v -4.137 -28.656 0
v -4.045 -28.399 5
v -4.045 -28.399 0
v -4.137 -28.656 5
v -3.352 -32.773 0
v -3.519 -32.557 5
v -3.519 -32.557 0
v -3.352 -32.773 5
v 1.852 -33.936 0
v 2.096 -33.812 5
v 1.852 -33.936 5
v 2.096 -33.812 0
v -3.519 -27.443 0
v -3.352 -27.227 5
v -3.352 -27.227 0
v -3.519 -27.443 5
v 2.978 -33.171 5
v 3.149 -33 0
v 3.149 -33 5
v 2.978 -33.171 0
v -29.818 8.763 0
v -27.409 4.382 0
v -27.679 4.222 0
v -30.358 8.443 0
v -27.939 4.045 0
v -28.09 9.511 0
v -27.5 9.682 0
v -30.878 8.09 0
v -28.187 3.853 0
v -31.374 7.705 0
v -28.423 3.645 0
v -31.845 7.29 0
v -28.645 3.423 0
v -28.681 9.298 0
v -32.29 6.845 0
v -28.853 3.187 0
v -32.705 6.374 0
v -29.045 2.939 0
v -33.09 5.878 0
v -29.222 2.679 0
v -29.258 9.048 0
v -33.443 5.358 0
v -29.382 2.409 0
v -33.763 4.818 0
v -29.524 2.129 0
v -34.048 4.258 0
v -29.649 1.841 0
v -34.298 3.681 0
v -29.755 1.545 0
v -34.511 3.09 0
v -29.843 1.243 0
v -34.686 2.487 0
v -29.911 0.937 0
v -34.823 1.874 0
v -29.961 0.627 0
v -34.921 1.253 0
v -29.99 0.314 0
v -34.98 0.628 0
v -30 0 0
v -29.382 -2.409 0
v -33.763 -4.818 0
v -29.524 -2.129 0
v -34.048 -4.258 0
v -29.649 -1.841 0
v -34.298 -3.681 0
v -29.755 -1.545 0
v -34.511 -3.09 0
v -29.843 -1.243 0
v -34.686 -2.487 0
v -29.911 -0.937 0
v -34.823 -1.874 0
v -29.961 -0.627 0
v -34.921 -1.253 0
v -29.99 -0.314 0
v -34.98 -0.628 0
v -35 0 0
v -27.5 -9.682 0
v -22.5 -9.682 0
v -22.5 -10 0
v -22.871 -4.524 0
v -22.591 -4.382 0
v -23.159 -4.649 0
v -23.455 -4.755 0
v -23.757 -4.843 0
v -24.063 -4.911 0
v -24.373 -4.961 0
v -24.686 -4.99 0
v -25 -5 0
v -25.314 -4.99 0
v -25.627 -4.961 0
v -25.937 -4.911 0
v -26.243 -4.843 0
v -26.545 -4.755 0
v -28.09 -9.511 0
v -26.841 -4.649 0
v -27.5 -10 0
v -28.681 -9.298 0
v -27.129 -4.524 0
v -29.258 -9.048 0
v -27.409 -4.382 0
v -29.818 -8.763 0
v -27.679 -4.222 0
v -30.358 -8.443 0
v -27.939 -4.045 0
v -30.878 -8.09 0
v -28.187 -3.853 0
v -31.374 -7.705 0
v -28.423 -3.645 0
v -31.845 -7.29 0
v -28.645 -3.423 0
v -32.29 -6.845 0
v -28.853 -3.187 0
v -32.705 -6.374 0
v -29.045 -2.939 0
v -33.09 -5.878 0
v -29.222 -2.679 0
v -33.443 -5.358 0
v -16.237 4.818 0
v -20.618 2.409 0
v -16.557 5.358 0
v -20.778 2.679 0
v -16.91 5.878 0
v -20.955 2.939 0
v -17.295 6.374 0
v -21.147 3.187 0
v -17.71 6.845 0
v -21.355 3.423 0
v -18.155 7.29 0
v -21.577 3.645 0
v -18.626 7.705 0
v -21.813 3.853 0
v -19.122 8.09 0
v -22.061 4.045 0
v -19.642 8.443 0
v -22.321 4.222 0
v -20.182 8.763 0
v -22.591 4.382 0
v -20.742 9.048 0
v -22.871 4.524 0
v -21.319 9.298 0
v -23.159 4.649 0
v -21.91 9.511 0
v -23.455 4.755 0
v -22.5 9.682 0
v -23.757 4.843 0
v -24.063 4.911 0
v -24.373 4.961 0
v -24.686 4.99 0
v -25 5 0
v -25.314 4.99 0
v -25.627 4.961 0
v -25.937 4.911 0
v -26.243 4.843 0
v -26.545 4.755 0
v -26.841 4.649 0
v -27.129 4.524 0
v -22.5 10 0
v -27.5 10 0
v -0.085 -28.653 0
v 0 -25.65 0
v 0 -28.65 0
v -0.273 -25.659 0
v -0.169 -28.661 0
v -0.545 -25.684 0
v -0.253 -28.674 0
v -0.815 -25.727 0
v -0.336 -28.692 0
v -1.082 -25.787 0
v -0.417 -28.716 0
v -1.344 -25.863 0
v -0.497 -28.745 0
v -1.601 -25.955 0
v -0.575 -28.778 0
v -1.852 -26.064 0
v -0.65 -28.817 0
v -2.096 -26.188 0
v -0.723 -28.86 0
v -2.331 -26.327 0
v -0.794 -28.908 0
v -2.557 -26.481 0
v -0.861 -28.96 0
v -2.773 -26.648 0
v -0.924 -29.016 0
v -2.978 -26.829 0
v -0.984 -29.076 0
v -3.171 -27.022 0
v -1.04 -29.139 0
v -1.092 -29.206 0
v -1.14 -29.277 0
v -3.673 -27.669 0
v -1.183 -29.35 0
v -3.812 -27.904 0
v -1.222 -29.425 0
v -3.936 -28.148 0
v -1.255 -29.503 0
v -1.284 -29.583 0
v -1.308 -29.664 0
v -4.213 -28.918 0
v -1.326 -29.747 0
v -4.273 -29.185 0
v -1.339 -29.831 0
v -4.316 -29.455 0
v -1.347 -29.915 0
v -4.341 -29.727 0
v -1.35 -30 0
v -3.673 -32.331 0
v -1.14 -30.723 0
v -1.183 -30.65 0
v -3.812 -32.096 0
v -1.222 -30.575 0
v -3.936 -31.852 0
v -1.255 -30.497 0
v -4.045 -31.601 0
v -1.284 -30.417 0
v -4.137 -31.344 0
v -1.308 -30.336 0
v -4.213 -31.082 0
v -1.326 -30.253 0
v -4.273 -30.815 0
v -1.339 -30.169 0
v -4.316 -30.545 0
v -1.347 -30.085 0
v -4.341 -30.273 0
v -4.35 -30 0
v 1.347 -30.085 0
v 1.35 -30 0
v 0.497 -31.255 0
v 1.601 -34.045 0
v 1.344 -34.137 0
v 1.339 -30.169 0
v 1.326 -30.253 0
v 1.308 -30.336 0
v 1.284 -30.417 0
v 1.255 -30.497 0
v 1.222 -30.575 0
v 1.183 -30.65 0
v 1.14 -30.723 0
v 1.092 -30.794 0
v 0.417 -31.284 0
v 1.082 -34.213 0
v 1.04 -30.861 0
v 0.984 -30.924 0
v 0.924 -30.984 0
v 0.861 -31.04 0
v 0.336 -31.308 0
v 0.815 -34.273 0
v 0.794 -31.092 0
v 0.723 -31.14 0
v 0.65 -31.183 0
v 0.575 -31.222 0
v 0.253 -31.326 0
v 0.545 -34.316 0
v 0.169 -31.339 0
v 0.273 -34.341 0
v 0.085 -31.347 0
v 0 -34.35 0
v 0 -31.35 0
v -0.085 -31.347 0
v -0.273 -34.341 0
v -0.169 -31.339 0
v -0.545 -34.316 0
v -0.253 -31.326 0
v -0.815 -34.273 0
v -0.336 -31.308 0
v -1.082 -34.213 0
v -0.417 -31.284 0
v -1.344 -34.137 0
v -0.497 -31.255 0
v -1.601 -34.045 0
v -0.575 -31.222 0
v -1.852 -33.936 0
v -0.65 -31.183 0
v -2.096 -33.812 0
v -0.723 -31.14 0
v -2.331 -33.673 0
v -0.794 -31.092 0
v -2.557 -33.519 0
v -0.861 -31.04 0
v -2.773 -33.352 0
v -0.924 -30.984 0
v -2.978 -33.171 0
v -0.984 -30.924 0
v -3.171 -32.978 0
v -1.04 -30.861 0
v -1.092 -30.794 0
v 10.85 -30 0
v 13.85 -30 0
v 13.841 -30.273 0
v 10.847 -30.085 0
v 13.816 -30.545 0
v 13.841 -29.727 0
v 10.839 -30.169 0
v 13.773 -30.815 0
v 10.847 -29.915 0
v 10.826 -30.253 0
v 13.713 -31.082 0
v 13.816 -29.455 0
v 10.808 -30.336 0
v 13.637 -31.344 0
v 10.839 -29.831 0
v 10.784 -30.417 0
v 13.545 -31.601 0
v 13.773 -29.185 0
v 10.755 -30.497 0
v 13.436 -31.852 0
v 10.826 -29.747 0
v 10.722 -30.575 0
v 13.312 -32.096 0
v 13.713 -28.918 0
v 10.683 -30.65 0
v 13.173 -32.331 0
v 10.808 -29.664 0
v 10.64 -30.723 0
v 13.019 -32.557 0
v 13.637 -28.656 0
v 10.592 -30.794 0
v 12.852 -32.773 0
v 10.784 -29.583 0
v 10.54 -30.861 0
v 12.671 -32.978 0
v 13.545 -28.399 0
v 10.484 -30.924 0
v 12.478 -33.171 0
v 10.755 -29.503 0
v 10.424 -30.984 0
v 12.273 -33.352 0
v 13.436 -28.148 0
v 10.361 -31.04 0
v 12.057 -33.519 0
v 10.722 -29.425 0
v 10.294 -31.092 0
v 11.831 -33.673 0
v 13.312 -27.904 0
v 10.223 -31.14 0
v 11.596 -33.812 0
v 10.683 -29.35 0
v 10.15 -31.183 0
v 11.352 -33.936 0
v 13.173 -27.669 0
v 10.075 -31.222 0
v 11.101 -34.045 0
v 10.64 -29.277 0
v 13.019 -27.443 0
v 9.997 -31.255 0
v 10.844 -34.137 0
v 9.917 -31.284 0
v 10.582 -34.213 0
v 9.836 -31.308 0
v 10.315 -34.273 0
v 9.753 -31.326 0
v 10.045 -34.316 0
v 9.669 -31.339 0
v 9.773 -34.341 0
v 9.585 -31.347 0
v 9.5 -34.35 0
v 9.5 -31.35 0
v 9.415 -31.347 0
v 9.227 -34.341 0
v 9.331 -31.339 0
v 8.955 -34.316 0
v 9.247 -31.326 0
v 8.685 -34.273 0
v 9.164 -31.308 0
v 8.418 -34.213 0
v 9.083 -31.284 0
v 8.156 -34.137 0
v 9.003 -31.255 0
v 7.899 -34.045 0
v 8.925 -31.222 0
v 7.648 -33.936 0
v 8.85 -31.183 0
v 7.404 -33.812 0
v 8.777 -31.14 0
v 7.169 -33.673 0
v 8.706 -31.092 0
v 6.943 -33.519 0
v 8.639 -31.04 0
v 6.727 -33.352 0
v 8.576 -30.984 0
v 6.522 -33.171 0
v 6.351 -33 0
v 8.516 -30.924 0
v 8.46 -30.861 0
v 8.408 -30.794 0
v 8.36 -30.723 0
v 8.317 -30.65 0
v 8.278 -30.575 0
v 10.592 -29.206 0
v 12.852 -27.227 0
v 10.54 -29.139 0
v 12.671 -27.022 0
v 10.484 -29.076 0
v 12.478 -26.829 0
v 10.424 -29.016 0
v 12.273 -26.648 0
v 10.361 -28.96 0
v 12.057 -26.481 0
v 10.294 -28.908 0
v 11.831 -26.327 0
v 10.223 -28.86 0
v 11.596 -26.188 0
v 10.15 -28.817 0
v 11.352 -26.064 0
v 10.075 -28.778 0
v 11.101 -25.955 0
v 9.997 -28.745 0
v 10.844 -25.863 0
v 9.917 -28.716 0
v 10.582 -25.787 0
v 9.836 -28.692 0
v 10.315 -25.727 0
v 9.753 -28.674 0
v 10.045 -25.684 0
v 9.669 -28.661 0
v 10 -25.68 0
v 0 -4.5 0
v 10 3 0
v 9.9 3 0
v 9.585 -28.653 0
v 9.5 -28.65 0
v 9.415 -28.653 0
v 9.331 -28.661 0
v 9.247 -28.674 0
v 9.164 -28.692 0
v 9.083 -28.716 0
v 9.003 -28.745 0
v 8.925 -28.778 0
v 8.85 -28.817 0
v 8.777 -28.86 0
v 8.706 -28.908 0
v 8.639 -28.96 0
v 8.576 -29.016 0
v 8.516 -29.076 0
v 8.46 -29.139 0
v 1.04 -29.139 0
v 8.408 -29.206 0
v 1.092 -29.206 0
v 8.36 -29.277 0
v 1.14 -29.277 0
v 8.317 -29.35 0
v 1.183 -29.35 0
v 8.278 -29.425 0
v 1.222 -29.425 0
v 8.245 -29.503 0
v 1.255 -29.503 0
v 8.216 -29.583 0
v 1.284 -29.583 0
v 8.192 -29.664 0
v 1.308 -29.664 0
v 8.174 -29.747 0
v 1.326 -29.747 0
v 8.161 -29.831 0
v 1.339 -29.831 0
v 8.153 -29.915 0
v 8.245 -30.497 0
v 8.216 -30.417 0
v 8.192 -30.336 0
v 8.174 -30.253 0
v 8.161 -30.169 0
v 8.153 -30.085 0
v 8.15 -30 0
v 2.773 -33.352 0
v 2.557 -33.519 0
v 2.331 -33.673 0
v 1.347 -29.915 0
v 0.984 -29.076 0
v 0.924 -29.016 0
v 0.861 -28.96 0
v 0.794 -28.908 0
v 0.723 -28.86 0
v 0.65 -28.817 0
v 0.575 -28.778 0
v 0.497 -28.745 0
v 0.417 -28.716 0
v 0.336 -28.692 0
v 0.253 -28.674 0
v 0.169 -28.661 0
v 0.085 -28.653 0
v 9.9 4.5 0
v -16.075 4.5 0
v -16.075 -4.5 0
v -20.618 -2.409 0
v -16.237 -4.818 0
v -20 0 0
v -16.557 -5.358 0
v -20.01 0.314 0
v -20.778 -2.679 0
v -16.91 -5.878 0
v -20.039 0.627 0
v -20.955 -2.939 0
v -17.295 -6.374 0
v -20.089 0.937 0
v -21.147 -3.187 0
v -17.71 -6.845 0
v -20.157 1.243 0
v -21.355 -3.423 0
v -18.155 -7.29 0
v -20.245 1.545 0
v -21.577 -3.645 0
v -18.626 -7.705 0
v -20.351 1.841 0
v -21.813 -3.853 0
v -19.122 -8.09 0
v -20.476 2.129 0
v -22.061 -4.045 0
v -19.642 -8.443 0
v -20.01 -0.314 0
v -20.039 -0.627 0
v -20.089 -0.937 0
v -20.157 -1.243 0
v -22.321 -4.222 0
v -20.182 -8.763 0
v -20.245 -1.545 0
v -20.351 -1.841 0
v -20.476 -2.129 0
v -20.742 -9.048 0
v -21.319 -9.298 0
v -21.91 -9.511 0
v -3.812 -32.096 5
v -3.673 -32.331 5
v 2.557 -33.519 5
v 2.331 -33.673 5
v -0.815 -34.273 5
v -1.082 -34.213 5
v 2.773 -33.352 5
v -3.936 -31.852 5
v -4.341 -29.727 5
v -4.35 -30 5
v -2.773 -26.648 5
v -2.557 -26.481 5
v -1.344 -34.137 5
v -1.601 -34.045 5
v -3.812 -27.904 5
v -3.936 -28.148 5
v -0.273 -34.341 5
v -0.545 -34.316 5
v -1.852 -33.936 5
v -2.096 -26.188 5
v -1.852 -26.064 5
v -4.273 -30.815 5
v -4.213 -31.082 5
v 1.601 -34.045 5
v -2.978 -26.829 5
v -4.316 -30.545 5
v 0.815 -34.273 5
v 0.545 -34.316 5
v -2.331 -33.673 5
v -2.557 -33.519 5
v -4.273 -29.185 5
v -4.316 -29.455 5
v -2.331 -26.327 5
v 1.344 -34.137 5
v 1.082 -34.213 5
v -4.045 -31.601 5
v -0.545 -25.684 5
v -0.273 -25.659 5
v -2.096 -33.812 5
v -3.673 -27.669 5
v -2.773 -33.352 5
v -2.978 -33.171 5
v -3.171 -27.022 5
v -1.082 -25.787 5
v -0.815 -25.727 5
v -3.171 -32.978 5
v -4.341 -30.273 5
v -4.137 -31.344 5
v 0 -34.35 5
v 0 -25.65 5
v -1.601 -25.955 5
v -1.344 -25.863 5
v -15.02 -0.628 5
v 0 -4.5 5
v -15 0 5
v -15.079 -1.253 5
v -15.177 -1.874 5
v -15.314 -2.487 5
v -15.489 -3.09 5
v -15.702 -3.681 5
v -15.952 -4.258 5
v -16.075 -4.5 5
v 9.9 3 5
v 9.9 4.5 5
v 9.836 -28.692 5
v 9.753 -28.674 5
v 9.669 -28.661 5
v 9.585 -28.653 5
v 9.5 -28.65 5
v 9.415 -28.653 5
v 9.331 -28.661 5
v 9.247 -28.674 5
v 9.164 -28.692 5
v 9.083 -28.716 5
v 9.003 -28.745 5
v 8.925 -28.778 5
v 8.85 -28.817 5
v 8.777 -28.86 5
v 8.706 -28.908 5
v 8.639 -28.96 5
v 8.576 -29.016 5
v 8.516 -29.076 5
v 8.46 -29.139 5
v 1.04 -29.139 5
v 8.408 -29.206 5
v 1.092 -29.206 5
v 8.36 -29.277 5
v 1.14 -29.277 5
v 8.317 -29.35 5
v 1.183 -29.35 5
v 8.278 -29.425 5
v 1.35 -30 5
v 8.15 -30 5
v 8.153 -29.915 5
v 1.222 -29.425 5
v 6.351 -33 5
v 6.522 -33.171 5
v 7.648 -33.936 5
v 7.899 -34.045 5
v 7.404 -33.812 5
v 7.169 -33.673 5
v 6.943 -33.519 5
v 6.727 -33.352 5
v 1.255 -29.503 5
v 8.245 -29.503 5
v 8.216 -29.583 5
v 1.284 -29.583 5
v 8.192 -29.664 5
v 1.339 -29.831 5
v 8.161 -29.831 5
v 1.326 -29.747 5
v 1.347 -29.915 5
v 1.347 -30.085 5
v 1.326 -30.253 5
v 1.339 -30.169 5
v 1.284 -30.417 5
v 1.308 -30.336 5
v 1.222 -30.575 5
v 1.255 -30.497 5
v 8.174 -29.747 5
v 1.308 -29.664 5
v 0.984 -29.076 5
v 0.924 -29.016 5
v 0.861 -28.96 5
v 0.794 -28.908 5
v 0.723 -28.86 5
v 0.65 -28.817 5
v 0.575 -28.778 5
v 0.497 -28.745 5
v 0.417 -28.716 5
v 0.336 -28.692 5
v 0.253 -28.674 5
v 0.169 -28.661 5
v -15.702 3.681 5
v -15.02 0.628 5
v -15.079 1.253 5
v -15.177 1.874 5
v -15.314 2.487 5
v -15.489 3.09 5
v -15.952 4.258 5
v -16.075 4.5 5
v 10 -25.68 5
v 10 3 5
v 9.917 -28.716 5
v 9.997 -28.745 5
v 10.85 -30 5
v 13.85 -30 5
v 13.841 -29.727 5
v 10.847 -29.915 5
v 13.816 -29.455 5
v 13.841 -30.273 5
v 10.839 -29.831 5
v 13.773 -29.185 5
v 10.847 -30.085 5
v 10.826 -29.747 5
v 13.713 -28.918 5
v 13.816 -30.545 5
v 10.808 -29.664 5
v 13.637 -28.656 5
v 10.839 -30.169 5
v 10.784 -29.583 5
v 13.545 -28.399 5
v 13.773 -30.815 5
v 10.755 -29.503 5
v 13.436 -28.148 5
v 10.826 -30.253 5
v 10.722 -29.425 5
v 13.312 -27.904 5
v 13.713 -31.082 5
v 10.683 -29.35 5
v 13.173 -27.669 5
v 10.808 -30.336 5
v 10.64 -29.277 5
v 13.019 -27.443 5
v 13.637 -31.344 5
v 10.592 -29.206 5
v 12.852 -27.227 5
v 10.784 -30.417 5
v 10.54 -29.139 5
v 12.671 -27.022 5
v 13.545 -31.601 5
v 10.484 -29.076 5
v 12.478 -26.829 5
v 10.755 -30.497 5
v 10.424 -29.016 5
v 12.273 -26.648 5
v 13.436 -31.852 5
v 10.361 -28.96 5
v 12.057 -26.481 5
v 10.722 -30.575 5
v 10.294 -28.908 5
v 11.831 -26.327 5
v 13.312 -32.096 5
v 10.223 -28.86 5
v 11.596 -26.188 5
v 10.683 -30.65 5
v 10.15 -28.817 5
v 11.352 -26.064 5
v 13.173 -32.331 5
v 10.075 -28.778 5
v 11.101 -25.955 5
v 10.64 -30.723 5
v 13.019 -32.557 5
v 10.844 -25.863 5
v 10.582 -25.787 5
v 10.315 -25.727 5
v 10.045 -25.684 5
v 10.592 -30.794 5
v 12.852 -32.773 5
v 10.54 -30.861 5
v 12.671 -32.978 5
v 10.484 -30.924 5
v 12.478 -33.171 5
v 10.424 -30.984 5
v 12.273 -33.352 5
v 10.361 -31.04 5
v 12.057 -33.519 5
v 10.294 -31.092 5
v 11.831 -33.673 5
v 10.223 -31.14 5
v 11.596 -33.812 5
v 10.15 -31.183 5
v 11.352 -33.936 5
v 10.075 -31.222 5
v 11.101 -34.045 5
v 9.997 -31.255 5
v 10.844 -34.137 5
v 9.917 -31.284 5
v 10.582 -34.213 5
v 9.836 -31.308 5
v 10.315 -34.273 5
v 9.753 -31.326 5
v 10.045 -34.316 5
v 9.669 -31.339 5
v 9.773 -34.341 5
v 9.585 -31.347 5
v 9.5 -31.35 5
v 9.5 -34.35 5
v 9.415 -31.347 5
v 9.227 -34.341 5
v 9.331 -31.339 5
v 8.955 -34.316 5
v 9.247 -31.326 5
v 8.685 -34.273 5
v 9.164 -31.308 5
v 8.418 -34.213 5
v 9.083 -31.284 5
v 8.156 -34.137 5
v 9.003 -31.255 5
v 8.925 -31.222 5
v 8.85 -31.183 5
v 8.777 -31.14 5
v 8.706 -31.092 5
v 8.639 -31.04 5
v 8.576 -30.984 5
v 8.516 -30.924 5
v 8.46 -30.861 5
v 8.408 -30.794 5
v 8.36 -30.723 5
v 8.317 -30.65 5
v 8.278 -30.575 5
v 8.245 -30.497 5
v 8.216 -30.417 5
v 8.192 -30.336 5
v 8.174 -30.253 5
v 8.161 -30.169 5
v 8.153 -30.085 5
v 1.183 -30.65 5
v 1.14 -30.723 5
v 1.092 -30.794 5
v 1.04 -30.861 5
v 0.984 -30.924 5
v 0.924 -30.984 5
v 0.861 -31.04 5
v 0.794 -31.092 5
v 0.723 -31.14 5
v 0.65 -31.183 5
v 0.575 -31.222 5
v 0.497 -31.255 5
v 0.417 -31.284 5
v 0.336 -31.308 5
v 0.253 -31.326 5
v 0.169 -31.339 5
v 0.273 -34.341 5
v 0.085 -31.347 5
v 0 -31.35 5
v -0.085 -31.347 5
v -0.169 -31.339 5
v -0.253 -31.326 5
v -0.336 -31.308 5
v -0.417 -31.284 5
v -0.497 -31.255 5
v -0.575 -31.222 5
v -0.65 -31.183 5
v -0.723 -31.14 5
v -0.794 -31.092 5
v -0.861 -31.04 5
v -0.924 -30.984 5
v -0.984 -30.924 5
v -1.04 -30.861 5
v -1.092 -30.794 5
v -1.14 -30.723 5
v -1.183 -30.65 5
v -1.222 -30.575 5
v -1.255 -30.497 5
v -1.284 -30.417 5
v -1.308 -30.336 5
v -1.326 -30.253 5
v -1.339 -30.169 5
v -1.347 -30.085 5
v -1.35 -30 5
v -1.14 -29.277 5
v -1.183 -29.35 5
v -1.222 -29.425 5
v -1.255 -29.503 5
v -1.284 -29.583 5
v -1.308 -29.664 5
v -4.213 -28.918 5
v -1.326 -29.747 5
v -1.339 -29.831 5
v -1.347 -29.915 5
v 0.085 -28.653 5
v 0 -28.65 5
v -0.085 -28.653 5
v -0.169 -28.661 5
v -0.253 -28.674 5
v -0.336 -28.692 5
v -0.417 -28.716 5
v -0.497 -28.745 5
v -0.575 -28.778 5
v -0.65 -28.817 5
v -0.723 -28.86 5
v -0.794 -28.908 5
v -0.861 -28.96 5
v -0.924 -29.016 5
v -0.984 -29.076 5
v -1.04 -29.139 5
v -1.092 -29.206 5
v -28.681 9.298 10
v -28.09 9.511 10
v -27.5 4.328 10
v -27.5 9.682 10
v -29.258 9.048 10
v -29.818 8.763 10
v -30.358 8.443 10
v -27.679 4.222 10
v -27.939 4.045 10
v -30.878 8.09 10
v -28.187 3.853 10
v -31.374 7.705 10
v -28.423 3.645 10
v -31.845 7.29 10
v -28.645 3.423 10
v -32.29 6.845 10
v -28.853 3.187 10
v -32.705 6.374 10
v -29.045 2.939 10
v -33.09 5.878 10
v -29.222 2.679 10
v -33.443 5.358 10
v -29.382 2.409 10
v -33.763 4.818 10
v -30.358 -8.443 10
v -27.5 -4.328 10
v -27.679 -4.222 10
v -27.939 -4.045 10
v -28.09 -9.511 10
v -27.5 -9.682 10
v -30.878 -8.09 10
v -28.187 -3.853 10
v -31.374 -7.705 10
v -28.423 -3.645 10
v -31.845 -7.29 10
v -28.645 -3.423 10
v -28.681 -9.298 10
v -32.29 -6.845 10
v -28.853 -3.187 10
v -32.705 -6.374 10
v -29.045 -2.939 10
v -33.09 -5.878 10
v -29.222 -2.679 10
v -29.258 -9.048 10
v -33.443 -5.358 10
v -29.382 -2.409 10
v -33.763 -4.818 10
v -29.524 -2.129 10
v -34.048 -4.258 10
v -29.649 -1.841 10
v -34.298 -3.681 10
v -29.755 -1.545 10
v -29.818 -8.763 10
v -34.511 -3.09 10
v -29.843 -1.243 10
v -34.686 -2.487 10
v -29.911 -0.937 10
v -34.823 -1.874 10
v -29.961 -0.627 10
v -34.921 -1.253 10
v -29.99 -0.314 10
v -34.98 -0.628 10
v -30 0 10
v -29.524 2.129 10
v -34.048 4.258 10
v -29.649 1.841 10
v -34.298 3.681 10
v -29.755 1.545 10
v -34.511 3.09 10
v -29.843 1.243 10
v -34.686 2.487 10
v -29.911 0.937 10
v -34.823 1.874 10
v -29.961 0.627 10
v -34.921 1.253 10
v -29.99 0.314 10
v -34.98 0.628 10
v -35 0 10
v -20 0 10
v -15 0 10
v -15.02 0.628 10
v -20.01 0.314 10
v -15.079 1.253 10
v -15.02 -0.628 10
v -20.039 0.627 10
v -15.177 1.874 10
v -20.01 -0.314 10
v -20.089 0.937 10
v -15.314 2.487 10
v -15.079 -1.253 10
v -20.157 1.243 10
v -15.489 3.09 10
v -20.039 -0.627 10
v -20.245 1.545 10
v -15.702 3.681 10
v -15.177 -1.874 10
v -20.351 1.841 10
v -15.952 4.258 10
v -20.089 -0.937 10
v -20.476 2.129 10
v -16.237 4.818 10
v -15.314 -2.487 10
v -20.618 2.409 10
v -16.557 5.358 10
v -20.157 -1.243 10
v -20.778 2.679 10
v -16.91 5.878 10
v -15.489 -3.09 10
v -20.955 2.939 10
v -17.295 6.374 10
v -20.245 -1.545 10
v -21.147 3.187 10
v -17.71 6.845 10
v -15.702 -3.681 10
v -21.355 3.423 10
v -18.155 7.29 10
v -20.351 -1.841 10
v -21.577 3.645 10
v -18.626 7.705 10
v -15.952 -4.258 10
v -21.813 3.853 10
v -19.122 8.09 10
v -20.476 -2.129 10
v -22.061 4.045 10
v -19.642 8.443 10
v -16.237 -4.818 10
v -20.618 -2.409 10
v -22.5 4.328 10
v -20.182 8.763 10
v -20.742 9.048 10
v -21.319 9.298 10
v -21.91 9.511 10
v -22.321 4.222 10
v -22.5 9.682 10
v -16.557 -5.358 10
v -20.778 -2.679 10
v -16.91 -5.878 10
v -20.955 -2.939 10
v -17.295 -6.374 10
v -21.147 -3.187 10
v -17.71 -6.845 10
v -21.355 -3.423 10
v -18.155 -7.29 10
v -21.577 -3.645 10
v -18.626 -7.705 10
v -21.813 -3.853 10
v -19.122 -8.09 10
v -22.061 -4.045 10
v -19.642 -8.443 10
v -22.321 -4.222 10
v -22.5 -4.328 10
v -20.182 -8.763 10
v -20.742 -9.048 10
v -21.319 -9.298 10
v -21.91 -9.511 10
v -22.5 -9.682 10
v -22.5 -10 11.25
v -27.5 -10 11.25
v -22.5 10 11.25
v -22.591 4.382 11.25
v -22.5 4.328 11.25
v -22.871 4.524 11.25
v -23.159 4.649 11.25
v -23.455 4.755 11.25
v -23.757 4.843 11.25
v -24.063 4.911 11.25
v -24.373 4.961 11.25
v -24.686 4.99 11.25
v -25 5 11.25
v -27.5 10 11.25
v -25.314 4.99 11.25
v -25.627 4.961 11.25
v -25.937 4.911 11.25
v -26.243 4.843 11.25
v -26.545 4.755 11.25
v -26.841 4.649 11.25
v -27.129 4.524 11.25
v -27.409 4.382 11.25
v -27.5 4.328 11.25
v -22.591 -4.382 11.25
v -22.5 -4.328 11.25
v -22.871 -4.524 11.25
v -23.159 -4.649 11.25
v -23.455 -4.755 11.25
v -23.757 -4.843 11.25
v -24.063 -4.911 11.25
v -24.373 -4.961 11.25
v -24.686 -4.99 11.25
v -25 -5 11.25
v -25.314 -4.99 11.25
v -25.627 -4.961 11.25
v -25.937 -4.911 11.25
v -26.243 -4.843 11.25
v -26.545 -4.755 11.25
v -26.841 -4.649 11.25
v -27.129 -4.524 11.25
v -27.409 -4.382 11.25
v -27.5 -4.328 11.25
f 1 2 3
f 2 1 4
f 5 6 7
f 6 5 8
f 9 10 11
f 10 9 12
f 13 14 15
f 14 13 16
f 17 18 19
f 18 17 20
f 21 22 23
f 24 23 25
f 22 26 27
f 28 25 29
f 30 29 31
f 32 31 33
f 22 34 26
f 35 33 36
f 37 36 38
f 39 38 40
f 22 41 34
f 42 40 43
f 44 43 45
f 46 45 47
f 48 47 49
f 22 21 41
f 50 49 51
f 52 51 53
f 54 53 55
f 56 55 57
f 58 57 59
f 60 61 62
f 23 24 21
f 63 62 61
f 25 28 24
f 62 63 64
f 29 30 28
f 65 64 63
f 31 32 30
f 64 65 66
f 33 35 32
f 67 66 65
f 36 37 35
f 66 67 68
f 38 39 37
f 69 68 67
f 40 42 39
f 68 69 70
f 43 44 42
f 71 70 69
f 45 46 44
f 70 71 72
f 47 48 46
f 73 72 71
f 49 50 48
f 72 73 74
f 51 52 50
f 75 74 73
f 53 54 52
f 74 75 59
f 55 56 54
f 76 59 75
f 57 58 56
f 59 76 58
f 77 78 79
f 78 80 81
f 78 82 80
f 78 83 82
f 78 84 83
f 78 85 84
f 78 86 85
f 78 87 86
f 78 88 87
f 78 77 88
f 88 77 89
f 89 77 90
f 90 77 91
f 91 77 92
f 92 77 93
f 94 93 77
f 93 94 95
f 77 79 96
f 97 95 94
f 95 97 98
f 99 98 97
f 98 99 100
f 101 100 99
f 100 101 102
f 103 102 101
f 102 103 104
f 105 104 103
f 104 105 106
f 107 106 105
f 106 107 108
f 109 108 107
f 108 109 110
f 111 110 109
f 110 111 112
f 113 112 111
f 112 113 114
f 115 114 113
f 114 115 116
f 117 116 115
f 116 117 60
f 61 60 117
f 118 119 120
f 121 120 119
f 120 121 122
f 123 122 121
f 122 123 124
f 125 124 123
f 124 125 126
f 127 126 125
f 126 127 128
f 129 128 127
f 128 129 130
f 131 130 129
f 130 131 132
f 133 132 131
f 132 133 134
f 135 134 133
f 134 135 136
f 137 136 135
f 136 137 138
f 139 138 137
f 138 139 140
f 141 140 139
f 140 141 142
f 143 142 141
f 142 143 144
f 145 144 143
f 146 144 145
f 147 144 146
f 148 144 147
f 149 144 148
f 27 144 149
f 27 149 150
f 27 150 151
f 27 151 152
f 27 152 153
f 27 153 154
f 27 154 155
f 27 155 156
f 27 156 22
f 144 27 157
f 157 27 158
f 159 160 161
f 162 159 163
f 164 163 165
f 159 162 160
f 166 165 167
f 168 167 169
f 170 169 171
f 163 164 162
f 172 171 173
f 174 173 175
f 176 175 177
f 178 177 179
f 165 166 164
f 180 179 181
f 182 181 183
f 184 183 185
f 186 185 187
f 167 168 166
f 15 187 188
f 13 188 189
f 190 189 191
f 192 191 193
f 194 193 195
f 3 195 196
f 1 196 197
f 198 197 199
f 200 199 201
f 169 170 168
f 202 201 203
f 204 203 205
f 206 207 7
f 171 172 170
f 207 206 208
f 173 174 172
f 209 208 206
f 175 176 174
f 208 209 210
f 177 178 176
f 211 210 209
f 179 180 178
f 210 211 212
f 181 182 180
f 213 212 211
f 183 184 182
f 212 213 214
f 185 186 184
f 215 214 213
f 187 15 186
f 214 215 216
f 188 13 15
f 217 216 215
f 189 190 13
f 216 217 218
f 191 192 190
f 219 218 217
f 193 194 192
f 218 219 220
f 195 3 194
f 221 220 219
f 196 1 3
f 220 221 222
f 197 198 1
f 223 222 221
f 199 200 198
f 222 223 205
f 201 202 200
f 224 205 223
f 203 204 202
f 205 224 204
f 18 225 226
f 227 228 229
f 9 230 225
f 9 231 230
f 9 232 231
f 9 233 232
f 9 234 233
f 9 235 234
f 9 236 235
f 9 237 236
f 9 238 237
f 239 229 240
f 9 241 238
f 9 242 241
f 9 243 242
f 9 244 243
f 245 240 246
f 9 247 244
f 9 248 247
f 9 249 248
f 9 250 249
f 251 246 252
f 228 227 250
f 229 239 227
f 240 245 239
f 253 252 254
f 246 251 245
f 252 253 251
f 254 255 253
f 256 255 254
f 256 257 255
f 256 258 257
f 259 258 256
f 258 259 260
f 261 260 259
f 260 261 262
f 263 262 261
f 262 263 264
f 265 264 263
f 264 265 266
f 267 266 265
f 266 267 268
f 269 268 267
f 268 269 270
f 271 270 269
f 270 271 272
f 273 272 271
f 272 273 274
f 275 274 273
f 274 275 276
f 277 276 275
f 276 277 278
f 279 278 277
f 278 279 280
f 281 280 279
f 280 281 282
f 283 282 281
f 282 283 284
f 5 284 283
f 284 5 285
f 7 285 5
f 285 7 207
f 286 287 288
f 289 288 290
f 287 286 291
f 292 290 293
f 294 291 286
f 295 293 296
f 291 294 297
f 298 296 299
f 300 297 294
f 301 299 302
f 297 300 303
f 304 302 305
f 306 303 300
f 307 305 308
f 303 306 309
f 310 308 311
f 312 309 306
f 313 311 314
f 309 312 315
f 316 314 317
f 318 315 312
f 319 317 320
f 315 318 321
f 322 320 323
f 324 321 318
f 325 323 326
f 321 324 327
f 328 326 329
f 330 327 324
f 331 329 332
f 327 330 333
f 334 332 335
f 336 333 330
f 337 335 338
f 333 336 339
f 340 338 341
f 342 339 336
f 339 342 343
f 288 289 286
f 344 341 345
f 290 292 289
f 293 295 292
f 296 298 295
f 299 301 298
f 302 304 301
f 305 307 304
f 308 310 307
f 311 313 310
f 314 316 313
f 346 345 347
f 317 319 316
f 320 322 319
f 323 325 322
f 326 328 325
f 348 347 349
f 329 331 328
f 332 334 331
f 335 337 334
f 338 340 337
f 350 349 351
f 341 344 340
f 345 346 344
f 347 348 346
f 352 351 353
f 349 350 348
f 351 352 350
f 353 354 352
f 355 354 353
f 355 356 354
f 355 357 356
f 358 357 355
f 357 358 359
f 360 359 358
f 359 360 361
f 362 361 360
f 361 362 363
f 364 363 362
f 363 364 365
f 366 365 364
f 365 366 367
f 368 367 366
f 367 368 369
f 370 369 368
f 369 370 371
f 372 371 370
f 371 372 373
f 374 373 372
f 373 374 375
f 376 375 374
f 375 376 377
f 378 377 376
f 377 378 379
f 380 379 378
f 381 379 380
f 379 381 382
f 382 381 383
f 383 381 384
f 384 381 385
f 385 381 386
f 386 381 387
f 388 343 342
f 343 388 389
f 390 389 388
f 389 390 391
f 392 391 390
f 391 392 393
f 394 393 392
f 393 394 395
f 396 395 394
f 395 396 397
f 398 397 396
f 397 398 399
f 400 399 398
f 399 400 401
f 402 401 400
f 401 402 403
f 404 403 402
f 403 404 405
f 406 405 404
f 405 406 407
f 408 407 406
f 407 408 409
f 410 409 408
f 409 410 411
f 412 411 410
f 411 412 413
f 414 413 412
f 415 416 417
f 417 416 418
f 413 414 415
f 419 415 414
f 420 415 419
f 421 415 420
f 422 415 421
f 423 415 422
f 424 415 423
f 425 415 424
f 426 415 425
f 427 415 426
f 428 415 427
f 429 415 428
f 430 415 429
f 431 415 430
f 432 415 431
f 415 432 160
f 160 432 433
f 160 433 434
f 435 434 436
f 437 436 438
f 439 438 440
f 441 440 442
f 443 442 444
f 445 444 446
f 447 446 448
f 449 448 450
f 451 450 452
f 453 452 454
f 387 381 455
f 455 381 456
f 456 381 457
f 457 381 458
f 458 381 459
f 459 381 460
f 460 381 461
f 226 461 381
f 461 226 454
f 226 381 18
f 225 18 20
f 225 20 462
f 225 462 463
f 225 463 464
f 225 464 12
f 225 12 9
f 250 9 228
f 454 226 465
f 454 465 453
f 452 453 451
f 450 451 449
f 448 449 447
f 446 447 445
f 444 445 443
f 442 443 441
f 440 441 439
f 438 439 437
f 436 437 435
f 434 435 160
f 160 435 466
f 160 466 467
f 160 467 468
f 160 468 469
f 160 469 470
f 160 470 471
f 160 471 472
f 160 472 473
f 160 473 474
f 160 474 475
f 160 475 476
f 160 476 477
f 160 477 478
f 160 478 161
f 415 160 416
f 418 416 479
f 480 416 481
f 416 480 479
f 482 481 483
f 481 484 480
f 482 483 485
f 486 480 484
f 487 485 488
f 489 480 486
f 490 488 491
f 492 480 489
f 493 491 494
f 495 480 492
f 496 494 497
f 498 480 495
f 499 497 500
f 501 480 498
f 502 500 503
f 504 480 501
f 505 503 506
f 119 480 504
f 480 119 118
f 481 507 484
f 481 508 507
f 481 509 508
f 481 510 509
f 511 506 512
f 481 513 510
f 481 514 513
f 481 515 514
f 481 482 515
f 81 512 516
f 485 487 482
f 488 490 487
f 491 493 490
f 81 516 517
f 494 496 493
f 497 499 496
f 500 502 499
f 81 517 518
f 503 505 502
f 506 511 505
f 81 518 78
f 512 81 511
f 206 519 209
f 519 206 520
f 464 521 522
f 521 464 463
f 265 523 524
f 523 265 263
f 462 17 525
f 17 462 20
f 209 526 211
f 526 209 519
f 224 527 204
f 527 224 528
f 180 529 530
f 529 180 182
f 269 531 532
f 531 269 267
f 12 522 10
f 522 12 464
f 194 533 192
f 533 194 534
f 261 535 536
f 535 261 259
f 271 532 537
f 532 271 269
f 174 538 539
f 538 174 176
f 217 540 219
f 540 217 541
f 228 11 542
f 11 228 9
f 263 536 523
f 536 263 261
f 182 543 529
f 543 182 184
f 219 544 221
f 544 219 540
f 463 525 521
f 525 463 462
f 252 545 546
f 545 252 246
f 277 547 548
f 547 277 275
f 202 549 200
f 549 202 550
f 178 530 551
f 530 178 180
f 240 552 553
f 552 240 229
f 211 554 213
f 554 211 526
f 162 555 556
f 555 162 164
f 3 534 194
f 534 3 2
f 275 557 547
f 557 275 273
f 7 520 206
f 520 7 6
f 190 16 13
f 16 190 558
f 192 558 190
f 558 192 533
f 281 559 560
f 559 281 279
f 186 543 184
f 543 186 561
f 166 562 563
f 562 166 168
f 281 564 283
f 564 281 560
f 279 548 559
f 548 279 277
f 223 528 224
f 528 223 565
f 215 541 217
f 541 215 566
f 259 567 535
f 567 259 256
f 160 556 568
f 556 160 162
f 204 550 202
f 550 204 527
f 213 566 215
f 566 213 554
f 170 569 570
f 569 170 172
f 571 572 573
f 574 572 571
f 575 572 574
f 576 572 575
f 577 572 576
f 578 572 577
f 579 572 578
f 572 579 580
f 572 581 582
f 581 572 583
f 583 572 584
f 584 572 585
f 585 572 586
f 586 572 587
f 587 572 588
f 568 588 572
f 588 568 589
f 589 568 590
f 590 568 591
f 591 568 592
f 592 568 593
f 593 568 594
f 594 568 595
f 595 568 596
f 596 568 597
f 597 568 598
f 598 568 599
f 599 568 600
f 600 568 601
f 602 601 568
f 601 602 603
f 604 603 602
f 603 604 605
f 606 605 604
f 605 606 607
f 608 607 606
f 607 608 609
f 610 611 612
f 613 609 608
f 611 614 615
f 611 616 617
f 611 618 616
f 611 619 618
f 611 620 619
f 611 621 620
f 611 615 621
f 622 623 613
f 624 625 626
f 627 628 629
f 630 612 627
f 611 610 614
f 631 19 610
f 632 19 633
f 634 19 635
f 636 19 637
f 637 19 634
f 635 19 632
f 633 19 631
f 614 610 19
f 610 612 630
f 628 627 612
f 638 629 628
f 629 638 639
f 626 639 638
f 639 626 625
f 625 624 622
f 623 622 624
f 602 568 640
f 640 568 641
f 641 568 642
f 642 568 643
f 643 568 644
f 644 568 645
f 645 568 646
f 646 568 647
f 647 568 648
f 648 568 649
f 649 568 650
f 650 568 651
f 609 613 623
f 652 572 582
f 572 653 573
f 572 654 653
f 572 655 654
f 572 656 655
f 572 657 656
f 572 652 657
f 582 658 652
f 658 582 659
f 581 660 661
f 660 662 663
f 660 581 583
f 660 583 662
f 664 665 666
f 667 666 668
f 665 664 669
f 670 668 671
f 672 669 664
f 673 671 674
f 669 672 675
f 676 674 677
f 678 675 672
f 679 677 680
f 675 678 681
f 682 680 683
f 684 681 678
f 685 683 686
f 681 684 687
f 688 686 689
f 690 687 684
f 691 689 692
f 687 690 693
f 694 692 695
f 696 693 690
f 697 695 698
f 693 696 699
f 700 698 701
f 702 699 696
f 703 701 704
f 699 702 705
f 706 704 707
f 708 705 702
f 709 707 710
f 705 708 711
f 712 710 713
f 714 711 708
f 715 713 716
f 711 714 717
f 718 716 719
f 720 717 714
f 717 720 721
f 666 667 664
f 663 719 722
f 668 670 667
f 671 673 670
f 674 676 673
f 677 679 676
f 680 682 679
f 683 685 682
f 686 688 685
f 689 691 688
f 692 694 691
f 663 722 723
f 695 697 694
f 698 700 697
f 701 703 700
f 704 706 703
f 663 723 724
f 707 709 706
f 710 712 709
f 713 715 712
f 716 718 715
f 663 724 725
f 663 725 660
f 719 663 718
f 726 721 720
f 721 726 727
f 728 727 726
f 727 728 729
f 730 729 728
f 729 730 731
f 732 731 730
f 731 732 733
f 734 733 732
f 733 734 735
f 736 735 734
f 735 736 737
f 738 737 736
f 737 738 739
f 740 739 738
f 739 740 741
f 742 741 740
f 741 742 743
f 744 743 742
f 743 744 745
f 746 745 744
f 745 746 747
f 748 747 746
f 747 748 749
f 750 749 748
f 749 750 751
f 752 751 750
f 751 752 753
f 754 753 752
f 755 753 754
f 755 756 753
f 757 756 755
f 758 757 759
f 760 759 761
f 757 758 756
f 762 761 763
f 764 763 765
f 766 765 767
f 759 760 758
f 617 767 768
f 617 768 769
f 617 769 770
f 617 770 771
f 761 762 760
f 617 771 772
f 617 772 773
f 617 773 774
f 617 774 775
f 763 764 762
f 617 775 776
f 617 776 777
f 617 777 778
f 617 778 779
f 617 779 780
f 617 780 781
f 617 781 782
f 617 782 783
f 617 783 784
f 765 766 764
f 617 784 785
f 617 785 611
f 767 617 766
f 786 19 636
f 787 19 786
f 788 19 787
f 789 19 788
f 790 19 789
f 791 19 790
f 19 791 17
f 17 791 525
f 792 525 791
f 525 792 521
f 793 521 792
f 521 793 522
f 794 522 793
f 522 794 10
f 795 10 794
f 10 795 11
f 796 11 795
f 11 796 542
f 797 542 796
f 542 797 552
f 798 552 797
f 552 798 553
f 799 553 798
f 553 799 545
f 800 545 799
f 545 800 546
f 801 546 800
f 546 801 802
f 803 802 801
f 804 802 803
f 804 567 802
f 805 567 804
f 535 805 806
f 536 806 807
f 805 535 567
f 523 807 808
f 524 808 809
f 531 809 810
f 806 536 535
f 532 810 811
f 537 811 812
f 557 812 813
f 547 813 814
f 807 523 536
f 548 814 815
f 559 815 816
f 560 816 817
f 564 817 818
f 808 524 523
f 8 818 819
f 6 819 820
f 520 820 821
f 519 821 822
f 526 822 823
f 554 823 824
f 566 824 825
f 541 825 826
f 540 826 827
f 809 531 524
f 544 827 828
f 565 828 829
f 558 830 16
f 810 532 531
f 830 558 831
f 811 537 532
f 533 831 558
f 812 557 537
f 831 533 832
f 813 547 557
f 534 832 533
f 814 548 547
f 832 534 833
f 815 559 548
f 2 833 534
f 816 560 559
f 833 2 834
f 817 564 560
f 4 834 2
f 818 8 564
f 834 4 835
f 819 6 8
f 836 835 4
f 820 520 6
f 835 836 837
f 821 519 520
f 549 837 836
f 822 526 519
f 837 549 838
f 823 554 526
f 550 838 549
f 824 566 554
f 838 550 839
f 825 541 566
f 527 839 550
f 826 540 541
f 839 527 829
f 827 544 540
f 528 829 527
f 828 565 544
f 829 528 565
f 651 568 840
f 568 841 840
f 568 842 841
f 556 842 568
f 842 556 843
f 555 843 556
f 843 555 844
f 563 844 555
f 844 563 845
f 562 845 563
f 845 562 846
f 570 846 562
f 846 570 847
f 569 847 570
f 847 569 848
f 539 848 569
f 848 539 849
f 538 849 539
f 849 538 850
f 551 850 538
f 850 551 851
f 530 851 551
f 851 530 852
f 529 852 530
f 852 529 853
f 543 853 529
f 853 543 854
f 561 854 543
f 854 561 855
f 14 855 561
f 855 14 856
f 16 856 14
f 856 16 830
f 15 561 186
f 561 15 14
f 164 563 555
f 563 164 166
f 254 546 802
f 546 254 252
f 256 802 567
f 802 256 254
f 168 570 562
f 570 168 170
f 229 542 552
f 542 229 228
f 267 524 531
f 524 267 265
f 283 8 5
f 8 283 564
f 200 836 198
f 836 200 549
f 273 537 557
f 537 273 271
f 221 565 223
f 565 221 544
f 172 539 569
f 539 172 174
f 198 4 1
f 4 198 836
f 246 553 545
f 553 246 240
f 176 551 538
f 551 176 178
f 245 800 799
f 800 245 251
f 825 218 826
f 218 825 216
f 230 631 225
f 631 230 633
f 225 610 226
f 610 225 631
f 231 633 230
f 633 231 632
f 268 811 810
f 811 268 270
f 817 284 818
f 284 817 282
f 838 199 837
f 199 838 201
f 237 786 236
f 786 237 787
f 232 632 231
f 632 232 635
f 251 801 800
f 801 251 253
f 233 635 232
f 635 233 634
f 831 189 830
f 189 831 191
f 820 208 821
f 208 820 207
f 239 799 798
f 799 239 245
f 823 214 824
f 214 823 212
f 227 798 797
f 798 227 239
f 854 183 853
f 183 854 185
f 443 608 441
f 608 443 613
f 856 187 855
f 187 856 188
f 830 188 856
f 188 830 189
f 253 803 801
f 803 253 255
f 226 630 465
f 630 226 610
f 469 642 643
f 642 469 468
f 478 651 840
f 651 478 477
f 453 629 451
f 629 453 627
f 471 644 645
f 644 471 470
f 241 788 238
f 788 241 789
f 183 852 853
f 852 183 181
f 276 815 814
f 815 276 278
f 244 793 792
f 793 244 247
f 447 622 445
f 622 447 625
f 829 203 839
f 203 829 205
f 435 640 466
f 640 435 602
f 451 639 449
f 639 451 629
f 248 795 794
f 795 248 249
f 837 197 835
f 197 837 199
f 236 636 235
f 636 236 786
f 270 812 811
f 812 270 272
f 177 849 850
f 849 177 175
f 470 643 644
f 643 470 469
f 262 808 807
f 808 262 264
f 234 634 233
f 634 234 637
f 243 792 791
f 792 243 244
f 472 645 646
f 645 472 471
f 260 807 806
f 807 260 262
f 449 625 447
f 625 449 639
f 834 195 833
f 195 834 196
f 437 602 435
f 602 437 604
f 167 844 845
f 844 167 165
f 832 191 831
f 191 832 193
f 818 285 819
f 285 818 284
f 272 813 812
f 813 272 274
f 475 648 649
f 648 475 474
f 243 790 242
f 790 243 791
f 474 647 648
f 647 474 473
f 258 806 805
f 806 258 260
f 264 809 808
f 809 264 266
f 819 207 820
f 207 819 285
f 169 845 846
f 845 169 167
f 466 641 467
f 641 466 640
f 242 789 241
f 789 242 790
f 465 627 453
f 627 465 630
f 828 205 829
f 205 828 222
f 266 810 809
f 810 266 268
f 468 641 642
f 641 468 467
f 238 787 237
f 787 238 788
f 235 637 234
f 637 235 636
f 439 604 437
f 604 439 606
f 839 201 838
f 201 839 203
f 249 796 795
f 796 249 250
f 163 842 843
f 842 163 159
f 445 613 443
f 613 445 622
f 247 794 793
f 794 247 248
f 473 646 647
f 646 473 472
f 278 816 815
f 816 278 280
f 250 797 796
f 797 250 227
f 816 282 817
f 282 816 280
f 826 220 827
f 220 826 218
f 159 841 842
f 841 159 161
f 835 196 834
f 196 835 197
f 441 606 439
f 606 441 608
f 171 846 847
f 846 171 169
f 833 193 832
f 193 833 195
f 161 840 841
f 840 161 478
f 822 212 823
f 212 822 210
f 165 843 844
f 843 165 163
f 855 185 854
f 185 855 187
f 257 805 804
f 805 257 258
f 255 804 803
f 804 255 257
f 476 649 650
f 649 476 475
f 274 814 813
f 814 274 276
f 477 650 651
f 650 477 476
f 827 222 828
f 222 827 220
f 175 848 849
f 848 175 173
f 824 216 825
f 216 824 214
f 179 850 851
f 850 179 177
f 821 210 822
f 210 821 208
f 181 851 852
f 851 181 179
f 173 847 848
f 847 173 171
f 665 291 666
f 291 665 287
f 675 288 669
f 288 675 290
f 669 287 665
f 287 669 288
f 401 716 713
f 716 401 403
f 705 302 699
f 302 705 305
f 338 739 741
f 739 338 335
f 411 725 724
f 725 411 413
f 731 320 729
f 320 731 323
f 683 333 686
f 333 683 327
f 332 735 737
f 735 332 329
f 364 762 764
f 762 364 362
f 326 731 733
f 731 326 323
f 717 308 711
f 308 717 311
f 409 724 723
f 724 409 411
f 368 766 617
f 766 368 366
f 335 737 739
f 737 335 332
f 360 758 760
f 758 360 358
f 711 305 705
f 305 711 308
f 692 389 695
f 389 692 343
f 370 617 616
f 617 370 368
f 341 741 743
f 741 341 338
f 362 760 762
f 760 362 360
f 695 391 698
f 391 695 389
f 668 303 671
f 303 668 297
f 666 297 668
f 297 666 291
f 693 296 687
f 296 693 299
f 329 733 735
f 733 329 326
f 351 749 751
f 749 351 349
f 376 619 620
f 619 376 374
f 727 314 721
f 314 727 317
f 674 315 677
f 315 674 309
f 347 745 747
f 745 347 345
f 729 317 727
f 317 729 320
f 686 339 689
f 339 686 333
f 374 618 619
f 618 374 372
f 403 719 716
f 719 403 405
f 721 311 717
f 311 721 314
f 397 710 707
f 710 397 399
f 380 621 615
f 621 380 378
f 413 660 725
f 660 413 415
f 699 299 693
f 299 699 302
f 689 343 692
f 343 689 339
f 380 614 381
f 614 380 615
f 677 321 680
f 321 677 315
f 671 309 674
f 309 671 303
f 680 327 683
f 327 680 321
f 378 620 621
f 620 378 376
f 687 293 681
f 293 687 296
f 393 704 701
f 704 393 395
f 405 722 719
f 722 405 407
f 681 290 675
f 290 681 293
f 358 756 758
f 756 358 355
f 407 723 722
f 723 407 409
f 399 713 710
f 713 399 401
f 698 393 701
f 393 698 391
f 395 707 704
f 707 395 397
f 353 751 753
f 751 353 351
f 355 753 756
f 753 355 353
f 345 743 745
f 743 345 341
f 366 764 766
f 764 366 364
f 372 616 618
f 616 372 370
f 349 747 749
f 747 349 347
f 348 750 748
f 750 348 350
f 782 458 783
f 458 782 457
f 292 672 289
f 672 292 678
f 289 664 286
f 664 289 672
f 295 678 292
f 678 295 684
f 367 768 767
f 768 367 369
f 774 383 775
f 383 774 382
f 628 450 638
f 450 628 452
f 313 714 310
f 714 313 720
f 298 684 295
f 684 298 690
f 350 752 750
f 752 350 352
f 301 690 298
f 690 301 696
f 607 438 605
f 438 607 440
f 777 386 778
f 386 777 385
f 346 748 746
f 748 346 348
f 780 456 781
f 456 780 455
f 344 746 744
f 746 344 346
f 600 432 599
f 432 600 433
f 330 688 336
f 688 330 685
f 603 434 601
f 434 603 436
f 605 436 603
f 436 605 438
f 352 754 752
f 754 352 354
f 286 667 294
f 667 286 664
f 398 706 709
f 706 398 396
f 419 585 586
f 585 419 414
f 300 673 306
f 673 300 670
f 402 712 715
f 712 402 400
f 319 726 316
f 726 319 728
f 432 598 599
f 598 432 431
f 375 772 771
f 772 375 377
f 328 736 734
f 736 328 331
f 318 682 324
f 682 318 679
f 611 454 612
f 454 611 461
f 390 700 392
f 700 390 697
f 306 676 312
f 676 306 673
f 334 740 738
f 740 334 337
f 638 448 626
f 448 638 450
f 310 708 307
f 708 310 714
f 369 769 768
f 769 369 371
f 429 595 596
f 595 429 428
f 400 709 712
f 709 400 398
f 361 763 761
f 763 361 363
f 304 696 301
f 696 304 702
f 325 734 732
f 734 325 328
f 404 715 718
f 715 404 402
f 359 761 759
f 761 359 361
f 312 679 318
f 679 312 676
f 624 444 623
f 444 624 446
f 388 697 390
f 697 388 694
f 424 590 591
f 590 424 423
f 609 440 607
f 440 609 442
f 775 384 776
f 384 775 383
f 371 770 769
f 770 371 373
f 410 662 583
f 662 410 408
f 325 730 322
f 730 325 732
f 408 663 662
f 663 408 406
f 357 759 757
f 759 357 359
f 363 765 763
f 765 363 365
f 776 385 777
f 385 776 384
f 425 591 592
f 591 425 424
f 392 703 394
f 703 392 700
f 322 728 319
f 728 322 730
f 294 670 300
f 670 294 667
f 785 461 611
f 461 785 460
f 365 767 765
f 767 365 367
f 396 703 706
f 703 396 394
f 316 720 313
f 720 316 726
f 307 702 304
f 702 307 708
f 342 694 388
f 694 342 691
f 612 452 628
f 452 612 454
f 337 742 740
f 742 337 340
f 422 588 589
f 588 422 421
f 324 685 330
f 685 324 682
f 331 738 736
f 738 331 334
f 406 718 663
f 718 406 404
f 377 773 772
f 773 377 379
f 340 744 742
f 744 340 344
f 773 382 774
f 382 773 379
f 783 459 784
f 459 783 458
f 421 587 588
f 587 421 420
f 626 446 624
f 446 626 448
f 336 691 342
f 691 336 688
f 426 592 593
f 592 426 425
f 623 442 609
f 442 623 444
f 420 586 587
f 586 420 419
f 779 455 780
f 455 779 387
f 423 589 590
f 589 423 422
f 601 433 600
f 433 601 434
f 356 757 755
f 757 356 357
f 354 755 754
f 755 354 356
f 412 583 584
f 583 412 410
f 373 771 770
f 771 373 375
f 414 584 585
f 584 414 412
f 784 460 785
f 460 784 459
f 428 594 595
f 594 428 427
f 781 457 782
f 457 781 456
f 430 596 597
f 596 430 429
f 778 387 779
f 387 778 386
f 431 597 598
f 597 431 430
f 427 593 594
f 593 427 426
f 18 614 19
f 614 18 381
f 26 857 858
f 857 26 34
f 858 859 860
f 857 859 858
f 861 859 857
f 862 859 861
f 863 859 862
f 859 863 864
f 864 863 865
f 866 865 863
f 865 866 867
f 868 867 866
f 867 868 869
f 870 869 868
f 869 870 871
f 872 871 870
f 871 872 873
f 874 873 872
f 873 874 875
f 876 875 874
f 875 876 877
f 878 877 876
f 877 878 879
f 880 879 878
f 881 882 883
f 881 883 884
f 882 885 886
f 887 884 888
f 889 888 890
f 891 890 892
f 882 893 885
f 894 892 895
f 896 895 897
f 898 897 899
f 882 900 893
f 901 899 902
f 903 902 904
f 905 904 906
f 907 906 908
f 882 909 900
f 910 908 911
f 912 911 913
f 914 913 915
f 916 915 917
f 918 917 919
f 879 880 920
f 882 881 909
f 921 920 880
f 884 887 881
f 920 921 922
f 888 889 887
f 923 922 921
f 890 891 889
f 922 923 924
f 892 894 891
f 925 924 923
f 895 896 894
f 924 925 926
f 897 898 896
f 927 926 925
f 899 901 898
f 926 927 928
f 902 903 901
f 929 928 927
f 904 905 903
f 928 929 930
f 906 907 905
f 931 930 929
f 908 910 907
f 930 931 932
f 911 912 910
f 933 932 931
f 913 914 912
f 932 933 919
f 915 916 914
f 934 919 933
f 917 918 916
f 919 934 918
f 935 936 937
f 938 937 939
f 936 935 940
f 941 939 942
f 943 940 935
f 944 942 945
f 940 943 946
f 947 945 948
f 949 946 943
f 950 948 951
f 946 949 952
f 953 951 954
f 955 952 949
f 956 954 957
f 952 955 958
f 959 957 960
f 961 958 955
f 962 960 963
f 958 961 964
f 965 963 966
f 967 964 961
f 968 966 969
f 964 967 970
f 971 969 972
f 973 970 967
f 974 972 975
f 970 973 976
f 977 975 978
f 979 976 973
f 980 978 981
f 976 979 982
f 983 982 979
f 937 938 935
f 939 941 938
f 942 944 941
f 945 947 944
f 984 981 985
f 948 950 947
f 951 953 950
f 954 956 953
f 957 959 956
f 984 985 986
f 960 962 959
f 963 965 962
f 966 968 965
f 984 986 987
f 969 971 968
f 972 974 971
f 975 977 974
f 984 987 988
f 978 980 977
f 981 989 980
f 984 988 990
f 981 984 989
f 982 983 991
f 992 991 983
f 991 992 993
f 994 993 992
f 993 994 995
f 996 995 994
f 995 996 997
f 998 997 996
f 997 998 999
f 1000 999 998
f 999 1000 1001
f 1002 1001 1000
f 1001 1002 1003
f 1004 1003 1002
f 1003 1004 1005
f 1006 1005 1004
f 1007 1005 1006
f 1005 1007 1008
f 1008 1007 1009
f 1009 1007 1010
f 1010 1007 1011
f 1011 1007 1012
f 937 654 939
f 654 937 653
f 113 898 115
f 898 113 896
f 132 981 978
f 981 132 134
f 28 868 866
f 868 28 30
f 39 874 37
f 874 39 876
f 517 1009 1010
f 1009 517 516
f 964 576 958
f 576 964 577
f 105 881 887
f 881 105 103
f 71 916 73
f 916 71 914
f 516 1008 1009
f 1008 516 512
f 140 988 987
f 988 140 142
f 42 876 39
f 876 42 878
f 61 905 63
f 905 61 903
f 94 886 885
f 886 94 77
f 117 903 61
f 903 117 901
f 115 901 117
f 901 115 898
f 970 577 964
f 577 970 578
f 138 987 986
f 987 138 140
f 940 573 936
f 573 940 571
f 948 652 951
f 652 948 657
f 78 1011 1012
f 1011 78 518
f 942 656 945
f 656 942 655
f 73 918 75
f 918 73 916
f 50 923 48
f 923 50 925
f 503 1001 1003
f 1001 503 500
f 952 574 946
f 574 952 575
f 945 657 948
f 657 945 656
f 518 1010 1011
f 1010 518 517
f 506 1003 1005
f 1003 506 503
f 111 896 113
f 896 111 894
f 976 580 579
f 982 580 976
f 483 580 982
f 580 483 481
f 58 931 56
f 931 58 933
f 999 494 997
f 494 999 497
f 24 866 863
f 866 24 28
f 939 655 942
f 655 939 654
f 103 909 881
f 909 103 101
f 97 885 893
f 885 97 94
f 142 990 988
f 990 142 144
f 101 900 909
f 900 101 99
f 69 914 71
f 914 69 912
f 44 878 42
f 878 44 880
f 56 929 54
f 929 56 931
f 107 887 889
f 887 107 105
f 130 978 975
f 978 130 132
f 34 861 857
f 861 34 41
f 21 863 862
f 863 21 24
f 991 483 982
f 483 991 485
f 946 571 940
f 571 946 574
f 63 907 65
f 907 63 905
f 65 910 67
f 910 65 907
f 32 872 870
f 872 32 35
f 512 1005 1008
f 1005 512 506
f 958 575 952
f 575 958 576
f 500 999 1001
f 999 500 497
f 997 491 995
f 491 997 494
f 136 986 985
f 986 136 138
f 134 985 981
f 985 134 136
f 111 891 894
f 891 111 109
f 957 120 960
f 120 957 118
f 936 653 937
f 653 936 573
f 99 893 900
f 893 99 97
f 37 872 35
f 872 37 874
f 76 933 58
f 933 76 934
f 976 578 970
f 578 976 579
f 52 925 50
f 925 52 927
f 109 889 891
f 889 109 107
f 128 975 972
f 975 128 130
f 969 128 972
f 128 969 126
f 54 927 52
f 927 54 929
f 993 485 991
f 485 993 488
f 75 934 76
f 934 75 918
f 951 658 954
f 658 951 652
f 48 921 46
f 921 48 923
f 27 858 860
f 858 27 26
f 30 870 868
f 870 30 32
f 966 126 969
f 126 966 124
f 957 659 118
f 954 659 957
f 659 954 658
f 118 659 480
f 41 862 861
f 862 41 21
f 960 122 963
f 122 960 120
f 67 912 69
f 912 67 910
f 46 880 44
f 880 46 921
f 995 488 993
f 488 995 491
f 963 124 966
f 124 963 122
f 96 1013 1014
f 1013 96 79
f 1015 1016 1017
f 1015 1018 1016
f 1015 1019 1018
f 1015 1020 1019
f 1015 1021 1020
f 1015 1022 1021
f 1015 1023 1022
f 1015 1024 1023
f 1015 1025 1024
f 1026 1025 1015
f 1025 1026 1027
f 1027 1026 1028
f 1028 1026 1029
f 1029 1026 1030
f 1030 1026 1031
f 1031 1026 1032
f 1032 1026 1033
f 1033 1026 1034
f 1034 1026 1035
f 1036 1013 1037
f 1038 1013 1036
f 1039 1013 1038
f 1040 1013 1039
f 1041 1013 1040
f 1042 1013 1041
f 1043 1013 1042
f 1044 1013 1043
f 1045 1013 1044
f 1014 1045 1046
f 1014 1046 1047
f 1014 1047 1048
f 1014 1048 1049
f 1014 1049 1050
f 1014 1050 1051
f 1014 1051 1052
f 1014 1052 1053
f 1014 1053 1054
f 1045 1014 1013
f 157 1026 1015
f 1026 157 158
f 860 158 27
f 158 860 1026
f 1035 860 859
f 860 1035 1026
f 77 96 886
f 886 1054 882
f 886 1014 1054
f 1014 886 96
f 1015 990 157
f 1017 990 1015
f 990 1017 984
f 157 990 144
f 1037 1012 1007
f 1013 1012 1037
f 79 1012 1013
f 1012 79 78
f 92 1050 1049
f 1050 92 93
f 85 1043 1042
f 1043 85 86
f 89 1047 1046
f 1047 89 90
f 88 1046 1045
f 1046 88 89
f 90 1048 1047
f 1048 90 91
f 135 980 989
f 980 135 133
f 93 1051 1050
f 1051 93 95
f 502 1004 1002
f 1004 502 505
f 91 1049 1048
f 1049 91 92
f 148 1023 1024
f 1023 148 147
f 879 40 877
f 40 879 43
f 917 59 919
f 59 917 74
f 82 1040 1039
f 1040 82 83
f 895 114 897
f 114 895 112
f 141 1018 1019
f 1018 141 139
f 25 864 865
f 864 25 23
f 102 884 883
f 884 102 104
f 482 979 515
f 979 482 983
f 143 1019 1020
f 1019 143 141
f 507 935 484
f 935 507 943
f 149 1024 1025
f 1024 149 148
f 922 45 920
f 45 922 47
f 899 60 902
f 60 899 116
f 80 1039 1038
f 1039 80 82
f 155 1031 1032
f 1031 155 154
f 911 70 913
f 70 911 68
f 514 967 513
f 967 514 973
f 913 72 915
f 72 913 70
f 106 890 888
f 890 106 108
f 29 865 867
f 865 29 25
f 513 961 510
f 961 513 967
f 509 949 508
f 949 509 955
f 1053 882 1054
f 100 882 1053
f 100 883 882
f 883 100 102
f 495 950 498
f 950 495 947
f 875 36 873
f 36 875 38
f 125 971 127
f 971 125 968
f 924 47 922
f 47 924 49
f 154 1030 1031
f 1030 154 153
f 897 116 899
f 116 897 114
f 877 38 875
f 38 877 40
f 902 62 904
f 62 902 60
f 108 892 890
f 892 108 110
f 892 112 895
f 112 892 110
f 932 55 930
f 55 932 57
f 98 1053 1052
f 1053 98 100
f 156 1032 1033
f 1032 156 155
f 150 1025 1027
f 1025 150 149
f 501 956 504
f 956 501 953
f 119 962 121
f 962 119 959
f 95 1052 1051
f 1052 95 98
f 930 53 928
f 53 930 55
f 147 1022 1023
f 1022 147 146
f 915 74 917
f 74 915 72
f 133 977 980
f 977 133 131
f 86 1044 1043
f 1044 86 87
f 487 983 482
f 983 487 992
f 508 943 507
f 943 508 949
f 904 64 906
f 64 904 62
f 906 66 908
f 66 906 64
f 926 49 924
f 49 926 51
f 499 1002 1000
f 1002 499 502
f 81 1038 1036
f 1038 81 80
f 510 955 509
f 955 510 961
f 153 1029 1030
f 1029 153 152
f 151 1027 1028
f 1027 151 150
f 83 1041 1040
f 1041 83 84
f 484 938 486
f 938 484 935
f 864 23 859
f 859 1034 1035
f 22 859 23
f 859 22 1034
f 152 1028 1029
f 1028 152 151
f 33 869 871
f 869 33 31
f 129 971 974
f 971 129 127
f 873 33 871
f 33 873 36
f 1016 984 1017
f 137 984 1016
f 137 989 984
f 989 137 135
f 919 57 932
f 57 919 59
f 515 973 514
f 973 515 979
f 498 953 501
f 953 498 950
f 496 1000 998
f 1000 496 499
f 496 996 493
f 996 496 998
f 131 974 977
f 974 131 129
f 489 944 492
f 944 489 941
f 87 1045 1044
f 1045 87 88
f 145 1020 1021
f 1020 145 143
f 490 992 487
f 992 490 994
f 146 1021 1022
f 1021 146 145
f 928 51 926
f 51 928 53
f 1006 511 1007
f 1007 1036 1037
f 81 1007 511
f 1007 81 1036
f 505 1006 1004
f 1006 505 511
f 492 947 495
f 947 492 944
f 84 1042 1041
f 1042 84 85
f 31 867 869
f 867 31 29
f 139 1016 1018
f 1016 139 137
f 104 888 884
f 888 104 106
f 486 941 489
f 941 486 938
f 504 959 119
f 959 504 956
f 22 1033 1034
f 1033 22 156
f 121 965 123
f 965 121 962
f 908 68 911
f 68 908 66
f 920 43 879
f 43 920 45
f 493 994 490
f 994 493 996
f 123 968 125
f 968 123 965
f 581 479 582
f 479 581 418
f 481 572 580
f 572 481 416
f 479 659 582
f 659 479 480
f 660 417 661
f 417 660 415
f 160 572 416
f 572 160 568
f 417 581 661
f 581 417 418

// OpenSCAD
// file: LUKENlib.scad
//####Corte eje motor BYJ###

module BYJshaft(tol=1){
            altura=3;
            difference(){
            circle(d=4.95+tol);
            translate([-5,(altura+tol)/2])
                square([10,10]);
                
            translate([-5,-10-(altura+tol)/2])
                square([10,10]);
                }
        }
        
        
   
//#####MOTOR BYJ#####

//corteBYJ(centerShaft=1);

module corteBYJ(centerShaft=1){

    //motor a pasos BYJ
    diamMotor=28;
    distTorMotor=35.4;
    diamTorMotor=3.8;
    tol=1;
    distCenterToShaft=6.5;
    dimCortCuad=18;
         if(centerShaft==1){
            translate([0,distCenterToShaft])
                 union(){
                    circle(d=diamMotor+tol);         //motor
                    square([dimCortCuad+(tol),(dimCortCuad*2)+tol],center=true);      //base
                    square([6+(2*tol),(20*2)+(2*tol)],center=true);      //cables
                    
                    
                    //tronillo motor 1
                    translate([distTorMotor/2,0])
                    circle(d=diamTorMotor+tol);
                    
                    //tronillo motor 2
                    translate([-distTorMotor/2,0])
                    circle(d=diamTorMotor+tol);
                }
            }
            
                     if(centerShaft==0){
          
                 union(){
                    circle(d=diamMotor+tol);         //motor
                    square([17+(tol),(17*2)+tol],center=true);      //base
                    square([6+(2*tol),(19*2)+(2*tol)],center=true);      //cables
                    
                    
                    //tronillo motor 1
                    translate([distTorMotor/2,0])
                    circle(d=diamTorMotor+tol);
                    
                    //tronillo motor 2
                    translate([-distTorMotor/2,0])
                    circle(d=diamTorMotor+tol);
                }
            }
            
        }


//#####POSTE####
   module Poste(altura=10,espesor=3,tol=1,diamShaft=2){
	   
	   difference(){
	      cylinder(d=(espesor*2)+diamShaft+tol,h=altura);
	   
		  cylinder(d=diamShaft+tol,h=altura*4,center=true);
	      
	   }
   }

//#####APOYOS PERFILES#####
module apoyoBase(
diametro=20,
tornillo=4,
tol=1,
altura=10,
altura1=1.25,
anchoCubo=6
){
    difference(){
        union(){
          cylinder(d=diametro,h=altura);
          translate([-diametro/2,-anchoCubo/2,0])
          cube([diametro,anchoCubo,altura+altura1]);
        }
        cylinder(d=tornillo+(tol*2),h=diametro*2,center=true);
    }
}
// main file
use <LUKENlib.scad>







//#####RENDERIZADO#####

/*
apoyoBase(
diametro=20,
tornillo=4,
tol=1,
altura=10,
altura1=1.25
);
*/


$fn=100;



diamShaft=1.7;
distPost=9.5;
//distSwPr=16;
distSwPr=25;


espesor=3;
tornillo=4;
tol=1;



mirror([0,1,0]){

translate([0,30,0])
union(){
    //union apoyos fin de carrera
    translate([espesor,-espesor,0])
    cube([espesor*1.2,espesor*2,5]);

    //poste tornillo
    for(i=[0,1]){
        translate([distPost*i,0])
        Poste(altura=5,espesor=espesor,tol=1,diamShaft=diamShaft);
    }
}

//union con apoyo de perfil
translate([-distSwPr+(espesor*2.3),-espesor*1.5,0])
cube([distSwPr+espesor,espesor*3,5]);


//union 90 con apoyo de perfil
translate([0,-espesor,0])
cube([10,30,5]);




//poste perfil
translate([-distSwPr,0,0])

rotate(90)
 apoyoBase(
//diametro=14,
diametro=20,
//tornillo=tornillo,
tornillo=8,
tol=tol,
altura=10,
altura1=1.25,
anchoCubo=5
);

}
//Poste(altura=10,espesor=espesor,tol=tol,diamShaft=tornillo+(tol*2));
